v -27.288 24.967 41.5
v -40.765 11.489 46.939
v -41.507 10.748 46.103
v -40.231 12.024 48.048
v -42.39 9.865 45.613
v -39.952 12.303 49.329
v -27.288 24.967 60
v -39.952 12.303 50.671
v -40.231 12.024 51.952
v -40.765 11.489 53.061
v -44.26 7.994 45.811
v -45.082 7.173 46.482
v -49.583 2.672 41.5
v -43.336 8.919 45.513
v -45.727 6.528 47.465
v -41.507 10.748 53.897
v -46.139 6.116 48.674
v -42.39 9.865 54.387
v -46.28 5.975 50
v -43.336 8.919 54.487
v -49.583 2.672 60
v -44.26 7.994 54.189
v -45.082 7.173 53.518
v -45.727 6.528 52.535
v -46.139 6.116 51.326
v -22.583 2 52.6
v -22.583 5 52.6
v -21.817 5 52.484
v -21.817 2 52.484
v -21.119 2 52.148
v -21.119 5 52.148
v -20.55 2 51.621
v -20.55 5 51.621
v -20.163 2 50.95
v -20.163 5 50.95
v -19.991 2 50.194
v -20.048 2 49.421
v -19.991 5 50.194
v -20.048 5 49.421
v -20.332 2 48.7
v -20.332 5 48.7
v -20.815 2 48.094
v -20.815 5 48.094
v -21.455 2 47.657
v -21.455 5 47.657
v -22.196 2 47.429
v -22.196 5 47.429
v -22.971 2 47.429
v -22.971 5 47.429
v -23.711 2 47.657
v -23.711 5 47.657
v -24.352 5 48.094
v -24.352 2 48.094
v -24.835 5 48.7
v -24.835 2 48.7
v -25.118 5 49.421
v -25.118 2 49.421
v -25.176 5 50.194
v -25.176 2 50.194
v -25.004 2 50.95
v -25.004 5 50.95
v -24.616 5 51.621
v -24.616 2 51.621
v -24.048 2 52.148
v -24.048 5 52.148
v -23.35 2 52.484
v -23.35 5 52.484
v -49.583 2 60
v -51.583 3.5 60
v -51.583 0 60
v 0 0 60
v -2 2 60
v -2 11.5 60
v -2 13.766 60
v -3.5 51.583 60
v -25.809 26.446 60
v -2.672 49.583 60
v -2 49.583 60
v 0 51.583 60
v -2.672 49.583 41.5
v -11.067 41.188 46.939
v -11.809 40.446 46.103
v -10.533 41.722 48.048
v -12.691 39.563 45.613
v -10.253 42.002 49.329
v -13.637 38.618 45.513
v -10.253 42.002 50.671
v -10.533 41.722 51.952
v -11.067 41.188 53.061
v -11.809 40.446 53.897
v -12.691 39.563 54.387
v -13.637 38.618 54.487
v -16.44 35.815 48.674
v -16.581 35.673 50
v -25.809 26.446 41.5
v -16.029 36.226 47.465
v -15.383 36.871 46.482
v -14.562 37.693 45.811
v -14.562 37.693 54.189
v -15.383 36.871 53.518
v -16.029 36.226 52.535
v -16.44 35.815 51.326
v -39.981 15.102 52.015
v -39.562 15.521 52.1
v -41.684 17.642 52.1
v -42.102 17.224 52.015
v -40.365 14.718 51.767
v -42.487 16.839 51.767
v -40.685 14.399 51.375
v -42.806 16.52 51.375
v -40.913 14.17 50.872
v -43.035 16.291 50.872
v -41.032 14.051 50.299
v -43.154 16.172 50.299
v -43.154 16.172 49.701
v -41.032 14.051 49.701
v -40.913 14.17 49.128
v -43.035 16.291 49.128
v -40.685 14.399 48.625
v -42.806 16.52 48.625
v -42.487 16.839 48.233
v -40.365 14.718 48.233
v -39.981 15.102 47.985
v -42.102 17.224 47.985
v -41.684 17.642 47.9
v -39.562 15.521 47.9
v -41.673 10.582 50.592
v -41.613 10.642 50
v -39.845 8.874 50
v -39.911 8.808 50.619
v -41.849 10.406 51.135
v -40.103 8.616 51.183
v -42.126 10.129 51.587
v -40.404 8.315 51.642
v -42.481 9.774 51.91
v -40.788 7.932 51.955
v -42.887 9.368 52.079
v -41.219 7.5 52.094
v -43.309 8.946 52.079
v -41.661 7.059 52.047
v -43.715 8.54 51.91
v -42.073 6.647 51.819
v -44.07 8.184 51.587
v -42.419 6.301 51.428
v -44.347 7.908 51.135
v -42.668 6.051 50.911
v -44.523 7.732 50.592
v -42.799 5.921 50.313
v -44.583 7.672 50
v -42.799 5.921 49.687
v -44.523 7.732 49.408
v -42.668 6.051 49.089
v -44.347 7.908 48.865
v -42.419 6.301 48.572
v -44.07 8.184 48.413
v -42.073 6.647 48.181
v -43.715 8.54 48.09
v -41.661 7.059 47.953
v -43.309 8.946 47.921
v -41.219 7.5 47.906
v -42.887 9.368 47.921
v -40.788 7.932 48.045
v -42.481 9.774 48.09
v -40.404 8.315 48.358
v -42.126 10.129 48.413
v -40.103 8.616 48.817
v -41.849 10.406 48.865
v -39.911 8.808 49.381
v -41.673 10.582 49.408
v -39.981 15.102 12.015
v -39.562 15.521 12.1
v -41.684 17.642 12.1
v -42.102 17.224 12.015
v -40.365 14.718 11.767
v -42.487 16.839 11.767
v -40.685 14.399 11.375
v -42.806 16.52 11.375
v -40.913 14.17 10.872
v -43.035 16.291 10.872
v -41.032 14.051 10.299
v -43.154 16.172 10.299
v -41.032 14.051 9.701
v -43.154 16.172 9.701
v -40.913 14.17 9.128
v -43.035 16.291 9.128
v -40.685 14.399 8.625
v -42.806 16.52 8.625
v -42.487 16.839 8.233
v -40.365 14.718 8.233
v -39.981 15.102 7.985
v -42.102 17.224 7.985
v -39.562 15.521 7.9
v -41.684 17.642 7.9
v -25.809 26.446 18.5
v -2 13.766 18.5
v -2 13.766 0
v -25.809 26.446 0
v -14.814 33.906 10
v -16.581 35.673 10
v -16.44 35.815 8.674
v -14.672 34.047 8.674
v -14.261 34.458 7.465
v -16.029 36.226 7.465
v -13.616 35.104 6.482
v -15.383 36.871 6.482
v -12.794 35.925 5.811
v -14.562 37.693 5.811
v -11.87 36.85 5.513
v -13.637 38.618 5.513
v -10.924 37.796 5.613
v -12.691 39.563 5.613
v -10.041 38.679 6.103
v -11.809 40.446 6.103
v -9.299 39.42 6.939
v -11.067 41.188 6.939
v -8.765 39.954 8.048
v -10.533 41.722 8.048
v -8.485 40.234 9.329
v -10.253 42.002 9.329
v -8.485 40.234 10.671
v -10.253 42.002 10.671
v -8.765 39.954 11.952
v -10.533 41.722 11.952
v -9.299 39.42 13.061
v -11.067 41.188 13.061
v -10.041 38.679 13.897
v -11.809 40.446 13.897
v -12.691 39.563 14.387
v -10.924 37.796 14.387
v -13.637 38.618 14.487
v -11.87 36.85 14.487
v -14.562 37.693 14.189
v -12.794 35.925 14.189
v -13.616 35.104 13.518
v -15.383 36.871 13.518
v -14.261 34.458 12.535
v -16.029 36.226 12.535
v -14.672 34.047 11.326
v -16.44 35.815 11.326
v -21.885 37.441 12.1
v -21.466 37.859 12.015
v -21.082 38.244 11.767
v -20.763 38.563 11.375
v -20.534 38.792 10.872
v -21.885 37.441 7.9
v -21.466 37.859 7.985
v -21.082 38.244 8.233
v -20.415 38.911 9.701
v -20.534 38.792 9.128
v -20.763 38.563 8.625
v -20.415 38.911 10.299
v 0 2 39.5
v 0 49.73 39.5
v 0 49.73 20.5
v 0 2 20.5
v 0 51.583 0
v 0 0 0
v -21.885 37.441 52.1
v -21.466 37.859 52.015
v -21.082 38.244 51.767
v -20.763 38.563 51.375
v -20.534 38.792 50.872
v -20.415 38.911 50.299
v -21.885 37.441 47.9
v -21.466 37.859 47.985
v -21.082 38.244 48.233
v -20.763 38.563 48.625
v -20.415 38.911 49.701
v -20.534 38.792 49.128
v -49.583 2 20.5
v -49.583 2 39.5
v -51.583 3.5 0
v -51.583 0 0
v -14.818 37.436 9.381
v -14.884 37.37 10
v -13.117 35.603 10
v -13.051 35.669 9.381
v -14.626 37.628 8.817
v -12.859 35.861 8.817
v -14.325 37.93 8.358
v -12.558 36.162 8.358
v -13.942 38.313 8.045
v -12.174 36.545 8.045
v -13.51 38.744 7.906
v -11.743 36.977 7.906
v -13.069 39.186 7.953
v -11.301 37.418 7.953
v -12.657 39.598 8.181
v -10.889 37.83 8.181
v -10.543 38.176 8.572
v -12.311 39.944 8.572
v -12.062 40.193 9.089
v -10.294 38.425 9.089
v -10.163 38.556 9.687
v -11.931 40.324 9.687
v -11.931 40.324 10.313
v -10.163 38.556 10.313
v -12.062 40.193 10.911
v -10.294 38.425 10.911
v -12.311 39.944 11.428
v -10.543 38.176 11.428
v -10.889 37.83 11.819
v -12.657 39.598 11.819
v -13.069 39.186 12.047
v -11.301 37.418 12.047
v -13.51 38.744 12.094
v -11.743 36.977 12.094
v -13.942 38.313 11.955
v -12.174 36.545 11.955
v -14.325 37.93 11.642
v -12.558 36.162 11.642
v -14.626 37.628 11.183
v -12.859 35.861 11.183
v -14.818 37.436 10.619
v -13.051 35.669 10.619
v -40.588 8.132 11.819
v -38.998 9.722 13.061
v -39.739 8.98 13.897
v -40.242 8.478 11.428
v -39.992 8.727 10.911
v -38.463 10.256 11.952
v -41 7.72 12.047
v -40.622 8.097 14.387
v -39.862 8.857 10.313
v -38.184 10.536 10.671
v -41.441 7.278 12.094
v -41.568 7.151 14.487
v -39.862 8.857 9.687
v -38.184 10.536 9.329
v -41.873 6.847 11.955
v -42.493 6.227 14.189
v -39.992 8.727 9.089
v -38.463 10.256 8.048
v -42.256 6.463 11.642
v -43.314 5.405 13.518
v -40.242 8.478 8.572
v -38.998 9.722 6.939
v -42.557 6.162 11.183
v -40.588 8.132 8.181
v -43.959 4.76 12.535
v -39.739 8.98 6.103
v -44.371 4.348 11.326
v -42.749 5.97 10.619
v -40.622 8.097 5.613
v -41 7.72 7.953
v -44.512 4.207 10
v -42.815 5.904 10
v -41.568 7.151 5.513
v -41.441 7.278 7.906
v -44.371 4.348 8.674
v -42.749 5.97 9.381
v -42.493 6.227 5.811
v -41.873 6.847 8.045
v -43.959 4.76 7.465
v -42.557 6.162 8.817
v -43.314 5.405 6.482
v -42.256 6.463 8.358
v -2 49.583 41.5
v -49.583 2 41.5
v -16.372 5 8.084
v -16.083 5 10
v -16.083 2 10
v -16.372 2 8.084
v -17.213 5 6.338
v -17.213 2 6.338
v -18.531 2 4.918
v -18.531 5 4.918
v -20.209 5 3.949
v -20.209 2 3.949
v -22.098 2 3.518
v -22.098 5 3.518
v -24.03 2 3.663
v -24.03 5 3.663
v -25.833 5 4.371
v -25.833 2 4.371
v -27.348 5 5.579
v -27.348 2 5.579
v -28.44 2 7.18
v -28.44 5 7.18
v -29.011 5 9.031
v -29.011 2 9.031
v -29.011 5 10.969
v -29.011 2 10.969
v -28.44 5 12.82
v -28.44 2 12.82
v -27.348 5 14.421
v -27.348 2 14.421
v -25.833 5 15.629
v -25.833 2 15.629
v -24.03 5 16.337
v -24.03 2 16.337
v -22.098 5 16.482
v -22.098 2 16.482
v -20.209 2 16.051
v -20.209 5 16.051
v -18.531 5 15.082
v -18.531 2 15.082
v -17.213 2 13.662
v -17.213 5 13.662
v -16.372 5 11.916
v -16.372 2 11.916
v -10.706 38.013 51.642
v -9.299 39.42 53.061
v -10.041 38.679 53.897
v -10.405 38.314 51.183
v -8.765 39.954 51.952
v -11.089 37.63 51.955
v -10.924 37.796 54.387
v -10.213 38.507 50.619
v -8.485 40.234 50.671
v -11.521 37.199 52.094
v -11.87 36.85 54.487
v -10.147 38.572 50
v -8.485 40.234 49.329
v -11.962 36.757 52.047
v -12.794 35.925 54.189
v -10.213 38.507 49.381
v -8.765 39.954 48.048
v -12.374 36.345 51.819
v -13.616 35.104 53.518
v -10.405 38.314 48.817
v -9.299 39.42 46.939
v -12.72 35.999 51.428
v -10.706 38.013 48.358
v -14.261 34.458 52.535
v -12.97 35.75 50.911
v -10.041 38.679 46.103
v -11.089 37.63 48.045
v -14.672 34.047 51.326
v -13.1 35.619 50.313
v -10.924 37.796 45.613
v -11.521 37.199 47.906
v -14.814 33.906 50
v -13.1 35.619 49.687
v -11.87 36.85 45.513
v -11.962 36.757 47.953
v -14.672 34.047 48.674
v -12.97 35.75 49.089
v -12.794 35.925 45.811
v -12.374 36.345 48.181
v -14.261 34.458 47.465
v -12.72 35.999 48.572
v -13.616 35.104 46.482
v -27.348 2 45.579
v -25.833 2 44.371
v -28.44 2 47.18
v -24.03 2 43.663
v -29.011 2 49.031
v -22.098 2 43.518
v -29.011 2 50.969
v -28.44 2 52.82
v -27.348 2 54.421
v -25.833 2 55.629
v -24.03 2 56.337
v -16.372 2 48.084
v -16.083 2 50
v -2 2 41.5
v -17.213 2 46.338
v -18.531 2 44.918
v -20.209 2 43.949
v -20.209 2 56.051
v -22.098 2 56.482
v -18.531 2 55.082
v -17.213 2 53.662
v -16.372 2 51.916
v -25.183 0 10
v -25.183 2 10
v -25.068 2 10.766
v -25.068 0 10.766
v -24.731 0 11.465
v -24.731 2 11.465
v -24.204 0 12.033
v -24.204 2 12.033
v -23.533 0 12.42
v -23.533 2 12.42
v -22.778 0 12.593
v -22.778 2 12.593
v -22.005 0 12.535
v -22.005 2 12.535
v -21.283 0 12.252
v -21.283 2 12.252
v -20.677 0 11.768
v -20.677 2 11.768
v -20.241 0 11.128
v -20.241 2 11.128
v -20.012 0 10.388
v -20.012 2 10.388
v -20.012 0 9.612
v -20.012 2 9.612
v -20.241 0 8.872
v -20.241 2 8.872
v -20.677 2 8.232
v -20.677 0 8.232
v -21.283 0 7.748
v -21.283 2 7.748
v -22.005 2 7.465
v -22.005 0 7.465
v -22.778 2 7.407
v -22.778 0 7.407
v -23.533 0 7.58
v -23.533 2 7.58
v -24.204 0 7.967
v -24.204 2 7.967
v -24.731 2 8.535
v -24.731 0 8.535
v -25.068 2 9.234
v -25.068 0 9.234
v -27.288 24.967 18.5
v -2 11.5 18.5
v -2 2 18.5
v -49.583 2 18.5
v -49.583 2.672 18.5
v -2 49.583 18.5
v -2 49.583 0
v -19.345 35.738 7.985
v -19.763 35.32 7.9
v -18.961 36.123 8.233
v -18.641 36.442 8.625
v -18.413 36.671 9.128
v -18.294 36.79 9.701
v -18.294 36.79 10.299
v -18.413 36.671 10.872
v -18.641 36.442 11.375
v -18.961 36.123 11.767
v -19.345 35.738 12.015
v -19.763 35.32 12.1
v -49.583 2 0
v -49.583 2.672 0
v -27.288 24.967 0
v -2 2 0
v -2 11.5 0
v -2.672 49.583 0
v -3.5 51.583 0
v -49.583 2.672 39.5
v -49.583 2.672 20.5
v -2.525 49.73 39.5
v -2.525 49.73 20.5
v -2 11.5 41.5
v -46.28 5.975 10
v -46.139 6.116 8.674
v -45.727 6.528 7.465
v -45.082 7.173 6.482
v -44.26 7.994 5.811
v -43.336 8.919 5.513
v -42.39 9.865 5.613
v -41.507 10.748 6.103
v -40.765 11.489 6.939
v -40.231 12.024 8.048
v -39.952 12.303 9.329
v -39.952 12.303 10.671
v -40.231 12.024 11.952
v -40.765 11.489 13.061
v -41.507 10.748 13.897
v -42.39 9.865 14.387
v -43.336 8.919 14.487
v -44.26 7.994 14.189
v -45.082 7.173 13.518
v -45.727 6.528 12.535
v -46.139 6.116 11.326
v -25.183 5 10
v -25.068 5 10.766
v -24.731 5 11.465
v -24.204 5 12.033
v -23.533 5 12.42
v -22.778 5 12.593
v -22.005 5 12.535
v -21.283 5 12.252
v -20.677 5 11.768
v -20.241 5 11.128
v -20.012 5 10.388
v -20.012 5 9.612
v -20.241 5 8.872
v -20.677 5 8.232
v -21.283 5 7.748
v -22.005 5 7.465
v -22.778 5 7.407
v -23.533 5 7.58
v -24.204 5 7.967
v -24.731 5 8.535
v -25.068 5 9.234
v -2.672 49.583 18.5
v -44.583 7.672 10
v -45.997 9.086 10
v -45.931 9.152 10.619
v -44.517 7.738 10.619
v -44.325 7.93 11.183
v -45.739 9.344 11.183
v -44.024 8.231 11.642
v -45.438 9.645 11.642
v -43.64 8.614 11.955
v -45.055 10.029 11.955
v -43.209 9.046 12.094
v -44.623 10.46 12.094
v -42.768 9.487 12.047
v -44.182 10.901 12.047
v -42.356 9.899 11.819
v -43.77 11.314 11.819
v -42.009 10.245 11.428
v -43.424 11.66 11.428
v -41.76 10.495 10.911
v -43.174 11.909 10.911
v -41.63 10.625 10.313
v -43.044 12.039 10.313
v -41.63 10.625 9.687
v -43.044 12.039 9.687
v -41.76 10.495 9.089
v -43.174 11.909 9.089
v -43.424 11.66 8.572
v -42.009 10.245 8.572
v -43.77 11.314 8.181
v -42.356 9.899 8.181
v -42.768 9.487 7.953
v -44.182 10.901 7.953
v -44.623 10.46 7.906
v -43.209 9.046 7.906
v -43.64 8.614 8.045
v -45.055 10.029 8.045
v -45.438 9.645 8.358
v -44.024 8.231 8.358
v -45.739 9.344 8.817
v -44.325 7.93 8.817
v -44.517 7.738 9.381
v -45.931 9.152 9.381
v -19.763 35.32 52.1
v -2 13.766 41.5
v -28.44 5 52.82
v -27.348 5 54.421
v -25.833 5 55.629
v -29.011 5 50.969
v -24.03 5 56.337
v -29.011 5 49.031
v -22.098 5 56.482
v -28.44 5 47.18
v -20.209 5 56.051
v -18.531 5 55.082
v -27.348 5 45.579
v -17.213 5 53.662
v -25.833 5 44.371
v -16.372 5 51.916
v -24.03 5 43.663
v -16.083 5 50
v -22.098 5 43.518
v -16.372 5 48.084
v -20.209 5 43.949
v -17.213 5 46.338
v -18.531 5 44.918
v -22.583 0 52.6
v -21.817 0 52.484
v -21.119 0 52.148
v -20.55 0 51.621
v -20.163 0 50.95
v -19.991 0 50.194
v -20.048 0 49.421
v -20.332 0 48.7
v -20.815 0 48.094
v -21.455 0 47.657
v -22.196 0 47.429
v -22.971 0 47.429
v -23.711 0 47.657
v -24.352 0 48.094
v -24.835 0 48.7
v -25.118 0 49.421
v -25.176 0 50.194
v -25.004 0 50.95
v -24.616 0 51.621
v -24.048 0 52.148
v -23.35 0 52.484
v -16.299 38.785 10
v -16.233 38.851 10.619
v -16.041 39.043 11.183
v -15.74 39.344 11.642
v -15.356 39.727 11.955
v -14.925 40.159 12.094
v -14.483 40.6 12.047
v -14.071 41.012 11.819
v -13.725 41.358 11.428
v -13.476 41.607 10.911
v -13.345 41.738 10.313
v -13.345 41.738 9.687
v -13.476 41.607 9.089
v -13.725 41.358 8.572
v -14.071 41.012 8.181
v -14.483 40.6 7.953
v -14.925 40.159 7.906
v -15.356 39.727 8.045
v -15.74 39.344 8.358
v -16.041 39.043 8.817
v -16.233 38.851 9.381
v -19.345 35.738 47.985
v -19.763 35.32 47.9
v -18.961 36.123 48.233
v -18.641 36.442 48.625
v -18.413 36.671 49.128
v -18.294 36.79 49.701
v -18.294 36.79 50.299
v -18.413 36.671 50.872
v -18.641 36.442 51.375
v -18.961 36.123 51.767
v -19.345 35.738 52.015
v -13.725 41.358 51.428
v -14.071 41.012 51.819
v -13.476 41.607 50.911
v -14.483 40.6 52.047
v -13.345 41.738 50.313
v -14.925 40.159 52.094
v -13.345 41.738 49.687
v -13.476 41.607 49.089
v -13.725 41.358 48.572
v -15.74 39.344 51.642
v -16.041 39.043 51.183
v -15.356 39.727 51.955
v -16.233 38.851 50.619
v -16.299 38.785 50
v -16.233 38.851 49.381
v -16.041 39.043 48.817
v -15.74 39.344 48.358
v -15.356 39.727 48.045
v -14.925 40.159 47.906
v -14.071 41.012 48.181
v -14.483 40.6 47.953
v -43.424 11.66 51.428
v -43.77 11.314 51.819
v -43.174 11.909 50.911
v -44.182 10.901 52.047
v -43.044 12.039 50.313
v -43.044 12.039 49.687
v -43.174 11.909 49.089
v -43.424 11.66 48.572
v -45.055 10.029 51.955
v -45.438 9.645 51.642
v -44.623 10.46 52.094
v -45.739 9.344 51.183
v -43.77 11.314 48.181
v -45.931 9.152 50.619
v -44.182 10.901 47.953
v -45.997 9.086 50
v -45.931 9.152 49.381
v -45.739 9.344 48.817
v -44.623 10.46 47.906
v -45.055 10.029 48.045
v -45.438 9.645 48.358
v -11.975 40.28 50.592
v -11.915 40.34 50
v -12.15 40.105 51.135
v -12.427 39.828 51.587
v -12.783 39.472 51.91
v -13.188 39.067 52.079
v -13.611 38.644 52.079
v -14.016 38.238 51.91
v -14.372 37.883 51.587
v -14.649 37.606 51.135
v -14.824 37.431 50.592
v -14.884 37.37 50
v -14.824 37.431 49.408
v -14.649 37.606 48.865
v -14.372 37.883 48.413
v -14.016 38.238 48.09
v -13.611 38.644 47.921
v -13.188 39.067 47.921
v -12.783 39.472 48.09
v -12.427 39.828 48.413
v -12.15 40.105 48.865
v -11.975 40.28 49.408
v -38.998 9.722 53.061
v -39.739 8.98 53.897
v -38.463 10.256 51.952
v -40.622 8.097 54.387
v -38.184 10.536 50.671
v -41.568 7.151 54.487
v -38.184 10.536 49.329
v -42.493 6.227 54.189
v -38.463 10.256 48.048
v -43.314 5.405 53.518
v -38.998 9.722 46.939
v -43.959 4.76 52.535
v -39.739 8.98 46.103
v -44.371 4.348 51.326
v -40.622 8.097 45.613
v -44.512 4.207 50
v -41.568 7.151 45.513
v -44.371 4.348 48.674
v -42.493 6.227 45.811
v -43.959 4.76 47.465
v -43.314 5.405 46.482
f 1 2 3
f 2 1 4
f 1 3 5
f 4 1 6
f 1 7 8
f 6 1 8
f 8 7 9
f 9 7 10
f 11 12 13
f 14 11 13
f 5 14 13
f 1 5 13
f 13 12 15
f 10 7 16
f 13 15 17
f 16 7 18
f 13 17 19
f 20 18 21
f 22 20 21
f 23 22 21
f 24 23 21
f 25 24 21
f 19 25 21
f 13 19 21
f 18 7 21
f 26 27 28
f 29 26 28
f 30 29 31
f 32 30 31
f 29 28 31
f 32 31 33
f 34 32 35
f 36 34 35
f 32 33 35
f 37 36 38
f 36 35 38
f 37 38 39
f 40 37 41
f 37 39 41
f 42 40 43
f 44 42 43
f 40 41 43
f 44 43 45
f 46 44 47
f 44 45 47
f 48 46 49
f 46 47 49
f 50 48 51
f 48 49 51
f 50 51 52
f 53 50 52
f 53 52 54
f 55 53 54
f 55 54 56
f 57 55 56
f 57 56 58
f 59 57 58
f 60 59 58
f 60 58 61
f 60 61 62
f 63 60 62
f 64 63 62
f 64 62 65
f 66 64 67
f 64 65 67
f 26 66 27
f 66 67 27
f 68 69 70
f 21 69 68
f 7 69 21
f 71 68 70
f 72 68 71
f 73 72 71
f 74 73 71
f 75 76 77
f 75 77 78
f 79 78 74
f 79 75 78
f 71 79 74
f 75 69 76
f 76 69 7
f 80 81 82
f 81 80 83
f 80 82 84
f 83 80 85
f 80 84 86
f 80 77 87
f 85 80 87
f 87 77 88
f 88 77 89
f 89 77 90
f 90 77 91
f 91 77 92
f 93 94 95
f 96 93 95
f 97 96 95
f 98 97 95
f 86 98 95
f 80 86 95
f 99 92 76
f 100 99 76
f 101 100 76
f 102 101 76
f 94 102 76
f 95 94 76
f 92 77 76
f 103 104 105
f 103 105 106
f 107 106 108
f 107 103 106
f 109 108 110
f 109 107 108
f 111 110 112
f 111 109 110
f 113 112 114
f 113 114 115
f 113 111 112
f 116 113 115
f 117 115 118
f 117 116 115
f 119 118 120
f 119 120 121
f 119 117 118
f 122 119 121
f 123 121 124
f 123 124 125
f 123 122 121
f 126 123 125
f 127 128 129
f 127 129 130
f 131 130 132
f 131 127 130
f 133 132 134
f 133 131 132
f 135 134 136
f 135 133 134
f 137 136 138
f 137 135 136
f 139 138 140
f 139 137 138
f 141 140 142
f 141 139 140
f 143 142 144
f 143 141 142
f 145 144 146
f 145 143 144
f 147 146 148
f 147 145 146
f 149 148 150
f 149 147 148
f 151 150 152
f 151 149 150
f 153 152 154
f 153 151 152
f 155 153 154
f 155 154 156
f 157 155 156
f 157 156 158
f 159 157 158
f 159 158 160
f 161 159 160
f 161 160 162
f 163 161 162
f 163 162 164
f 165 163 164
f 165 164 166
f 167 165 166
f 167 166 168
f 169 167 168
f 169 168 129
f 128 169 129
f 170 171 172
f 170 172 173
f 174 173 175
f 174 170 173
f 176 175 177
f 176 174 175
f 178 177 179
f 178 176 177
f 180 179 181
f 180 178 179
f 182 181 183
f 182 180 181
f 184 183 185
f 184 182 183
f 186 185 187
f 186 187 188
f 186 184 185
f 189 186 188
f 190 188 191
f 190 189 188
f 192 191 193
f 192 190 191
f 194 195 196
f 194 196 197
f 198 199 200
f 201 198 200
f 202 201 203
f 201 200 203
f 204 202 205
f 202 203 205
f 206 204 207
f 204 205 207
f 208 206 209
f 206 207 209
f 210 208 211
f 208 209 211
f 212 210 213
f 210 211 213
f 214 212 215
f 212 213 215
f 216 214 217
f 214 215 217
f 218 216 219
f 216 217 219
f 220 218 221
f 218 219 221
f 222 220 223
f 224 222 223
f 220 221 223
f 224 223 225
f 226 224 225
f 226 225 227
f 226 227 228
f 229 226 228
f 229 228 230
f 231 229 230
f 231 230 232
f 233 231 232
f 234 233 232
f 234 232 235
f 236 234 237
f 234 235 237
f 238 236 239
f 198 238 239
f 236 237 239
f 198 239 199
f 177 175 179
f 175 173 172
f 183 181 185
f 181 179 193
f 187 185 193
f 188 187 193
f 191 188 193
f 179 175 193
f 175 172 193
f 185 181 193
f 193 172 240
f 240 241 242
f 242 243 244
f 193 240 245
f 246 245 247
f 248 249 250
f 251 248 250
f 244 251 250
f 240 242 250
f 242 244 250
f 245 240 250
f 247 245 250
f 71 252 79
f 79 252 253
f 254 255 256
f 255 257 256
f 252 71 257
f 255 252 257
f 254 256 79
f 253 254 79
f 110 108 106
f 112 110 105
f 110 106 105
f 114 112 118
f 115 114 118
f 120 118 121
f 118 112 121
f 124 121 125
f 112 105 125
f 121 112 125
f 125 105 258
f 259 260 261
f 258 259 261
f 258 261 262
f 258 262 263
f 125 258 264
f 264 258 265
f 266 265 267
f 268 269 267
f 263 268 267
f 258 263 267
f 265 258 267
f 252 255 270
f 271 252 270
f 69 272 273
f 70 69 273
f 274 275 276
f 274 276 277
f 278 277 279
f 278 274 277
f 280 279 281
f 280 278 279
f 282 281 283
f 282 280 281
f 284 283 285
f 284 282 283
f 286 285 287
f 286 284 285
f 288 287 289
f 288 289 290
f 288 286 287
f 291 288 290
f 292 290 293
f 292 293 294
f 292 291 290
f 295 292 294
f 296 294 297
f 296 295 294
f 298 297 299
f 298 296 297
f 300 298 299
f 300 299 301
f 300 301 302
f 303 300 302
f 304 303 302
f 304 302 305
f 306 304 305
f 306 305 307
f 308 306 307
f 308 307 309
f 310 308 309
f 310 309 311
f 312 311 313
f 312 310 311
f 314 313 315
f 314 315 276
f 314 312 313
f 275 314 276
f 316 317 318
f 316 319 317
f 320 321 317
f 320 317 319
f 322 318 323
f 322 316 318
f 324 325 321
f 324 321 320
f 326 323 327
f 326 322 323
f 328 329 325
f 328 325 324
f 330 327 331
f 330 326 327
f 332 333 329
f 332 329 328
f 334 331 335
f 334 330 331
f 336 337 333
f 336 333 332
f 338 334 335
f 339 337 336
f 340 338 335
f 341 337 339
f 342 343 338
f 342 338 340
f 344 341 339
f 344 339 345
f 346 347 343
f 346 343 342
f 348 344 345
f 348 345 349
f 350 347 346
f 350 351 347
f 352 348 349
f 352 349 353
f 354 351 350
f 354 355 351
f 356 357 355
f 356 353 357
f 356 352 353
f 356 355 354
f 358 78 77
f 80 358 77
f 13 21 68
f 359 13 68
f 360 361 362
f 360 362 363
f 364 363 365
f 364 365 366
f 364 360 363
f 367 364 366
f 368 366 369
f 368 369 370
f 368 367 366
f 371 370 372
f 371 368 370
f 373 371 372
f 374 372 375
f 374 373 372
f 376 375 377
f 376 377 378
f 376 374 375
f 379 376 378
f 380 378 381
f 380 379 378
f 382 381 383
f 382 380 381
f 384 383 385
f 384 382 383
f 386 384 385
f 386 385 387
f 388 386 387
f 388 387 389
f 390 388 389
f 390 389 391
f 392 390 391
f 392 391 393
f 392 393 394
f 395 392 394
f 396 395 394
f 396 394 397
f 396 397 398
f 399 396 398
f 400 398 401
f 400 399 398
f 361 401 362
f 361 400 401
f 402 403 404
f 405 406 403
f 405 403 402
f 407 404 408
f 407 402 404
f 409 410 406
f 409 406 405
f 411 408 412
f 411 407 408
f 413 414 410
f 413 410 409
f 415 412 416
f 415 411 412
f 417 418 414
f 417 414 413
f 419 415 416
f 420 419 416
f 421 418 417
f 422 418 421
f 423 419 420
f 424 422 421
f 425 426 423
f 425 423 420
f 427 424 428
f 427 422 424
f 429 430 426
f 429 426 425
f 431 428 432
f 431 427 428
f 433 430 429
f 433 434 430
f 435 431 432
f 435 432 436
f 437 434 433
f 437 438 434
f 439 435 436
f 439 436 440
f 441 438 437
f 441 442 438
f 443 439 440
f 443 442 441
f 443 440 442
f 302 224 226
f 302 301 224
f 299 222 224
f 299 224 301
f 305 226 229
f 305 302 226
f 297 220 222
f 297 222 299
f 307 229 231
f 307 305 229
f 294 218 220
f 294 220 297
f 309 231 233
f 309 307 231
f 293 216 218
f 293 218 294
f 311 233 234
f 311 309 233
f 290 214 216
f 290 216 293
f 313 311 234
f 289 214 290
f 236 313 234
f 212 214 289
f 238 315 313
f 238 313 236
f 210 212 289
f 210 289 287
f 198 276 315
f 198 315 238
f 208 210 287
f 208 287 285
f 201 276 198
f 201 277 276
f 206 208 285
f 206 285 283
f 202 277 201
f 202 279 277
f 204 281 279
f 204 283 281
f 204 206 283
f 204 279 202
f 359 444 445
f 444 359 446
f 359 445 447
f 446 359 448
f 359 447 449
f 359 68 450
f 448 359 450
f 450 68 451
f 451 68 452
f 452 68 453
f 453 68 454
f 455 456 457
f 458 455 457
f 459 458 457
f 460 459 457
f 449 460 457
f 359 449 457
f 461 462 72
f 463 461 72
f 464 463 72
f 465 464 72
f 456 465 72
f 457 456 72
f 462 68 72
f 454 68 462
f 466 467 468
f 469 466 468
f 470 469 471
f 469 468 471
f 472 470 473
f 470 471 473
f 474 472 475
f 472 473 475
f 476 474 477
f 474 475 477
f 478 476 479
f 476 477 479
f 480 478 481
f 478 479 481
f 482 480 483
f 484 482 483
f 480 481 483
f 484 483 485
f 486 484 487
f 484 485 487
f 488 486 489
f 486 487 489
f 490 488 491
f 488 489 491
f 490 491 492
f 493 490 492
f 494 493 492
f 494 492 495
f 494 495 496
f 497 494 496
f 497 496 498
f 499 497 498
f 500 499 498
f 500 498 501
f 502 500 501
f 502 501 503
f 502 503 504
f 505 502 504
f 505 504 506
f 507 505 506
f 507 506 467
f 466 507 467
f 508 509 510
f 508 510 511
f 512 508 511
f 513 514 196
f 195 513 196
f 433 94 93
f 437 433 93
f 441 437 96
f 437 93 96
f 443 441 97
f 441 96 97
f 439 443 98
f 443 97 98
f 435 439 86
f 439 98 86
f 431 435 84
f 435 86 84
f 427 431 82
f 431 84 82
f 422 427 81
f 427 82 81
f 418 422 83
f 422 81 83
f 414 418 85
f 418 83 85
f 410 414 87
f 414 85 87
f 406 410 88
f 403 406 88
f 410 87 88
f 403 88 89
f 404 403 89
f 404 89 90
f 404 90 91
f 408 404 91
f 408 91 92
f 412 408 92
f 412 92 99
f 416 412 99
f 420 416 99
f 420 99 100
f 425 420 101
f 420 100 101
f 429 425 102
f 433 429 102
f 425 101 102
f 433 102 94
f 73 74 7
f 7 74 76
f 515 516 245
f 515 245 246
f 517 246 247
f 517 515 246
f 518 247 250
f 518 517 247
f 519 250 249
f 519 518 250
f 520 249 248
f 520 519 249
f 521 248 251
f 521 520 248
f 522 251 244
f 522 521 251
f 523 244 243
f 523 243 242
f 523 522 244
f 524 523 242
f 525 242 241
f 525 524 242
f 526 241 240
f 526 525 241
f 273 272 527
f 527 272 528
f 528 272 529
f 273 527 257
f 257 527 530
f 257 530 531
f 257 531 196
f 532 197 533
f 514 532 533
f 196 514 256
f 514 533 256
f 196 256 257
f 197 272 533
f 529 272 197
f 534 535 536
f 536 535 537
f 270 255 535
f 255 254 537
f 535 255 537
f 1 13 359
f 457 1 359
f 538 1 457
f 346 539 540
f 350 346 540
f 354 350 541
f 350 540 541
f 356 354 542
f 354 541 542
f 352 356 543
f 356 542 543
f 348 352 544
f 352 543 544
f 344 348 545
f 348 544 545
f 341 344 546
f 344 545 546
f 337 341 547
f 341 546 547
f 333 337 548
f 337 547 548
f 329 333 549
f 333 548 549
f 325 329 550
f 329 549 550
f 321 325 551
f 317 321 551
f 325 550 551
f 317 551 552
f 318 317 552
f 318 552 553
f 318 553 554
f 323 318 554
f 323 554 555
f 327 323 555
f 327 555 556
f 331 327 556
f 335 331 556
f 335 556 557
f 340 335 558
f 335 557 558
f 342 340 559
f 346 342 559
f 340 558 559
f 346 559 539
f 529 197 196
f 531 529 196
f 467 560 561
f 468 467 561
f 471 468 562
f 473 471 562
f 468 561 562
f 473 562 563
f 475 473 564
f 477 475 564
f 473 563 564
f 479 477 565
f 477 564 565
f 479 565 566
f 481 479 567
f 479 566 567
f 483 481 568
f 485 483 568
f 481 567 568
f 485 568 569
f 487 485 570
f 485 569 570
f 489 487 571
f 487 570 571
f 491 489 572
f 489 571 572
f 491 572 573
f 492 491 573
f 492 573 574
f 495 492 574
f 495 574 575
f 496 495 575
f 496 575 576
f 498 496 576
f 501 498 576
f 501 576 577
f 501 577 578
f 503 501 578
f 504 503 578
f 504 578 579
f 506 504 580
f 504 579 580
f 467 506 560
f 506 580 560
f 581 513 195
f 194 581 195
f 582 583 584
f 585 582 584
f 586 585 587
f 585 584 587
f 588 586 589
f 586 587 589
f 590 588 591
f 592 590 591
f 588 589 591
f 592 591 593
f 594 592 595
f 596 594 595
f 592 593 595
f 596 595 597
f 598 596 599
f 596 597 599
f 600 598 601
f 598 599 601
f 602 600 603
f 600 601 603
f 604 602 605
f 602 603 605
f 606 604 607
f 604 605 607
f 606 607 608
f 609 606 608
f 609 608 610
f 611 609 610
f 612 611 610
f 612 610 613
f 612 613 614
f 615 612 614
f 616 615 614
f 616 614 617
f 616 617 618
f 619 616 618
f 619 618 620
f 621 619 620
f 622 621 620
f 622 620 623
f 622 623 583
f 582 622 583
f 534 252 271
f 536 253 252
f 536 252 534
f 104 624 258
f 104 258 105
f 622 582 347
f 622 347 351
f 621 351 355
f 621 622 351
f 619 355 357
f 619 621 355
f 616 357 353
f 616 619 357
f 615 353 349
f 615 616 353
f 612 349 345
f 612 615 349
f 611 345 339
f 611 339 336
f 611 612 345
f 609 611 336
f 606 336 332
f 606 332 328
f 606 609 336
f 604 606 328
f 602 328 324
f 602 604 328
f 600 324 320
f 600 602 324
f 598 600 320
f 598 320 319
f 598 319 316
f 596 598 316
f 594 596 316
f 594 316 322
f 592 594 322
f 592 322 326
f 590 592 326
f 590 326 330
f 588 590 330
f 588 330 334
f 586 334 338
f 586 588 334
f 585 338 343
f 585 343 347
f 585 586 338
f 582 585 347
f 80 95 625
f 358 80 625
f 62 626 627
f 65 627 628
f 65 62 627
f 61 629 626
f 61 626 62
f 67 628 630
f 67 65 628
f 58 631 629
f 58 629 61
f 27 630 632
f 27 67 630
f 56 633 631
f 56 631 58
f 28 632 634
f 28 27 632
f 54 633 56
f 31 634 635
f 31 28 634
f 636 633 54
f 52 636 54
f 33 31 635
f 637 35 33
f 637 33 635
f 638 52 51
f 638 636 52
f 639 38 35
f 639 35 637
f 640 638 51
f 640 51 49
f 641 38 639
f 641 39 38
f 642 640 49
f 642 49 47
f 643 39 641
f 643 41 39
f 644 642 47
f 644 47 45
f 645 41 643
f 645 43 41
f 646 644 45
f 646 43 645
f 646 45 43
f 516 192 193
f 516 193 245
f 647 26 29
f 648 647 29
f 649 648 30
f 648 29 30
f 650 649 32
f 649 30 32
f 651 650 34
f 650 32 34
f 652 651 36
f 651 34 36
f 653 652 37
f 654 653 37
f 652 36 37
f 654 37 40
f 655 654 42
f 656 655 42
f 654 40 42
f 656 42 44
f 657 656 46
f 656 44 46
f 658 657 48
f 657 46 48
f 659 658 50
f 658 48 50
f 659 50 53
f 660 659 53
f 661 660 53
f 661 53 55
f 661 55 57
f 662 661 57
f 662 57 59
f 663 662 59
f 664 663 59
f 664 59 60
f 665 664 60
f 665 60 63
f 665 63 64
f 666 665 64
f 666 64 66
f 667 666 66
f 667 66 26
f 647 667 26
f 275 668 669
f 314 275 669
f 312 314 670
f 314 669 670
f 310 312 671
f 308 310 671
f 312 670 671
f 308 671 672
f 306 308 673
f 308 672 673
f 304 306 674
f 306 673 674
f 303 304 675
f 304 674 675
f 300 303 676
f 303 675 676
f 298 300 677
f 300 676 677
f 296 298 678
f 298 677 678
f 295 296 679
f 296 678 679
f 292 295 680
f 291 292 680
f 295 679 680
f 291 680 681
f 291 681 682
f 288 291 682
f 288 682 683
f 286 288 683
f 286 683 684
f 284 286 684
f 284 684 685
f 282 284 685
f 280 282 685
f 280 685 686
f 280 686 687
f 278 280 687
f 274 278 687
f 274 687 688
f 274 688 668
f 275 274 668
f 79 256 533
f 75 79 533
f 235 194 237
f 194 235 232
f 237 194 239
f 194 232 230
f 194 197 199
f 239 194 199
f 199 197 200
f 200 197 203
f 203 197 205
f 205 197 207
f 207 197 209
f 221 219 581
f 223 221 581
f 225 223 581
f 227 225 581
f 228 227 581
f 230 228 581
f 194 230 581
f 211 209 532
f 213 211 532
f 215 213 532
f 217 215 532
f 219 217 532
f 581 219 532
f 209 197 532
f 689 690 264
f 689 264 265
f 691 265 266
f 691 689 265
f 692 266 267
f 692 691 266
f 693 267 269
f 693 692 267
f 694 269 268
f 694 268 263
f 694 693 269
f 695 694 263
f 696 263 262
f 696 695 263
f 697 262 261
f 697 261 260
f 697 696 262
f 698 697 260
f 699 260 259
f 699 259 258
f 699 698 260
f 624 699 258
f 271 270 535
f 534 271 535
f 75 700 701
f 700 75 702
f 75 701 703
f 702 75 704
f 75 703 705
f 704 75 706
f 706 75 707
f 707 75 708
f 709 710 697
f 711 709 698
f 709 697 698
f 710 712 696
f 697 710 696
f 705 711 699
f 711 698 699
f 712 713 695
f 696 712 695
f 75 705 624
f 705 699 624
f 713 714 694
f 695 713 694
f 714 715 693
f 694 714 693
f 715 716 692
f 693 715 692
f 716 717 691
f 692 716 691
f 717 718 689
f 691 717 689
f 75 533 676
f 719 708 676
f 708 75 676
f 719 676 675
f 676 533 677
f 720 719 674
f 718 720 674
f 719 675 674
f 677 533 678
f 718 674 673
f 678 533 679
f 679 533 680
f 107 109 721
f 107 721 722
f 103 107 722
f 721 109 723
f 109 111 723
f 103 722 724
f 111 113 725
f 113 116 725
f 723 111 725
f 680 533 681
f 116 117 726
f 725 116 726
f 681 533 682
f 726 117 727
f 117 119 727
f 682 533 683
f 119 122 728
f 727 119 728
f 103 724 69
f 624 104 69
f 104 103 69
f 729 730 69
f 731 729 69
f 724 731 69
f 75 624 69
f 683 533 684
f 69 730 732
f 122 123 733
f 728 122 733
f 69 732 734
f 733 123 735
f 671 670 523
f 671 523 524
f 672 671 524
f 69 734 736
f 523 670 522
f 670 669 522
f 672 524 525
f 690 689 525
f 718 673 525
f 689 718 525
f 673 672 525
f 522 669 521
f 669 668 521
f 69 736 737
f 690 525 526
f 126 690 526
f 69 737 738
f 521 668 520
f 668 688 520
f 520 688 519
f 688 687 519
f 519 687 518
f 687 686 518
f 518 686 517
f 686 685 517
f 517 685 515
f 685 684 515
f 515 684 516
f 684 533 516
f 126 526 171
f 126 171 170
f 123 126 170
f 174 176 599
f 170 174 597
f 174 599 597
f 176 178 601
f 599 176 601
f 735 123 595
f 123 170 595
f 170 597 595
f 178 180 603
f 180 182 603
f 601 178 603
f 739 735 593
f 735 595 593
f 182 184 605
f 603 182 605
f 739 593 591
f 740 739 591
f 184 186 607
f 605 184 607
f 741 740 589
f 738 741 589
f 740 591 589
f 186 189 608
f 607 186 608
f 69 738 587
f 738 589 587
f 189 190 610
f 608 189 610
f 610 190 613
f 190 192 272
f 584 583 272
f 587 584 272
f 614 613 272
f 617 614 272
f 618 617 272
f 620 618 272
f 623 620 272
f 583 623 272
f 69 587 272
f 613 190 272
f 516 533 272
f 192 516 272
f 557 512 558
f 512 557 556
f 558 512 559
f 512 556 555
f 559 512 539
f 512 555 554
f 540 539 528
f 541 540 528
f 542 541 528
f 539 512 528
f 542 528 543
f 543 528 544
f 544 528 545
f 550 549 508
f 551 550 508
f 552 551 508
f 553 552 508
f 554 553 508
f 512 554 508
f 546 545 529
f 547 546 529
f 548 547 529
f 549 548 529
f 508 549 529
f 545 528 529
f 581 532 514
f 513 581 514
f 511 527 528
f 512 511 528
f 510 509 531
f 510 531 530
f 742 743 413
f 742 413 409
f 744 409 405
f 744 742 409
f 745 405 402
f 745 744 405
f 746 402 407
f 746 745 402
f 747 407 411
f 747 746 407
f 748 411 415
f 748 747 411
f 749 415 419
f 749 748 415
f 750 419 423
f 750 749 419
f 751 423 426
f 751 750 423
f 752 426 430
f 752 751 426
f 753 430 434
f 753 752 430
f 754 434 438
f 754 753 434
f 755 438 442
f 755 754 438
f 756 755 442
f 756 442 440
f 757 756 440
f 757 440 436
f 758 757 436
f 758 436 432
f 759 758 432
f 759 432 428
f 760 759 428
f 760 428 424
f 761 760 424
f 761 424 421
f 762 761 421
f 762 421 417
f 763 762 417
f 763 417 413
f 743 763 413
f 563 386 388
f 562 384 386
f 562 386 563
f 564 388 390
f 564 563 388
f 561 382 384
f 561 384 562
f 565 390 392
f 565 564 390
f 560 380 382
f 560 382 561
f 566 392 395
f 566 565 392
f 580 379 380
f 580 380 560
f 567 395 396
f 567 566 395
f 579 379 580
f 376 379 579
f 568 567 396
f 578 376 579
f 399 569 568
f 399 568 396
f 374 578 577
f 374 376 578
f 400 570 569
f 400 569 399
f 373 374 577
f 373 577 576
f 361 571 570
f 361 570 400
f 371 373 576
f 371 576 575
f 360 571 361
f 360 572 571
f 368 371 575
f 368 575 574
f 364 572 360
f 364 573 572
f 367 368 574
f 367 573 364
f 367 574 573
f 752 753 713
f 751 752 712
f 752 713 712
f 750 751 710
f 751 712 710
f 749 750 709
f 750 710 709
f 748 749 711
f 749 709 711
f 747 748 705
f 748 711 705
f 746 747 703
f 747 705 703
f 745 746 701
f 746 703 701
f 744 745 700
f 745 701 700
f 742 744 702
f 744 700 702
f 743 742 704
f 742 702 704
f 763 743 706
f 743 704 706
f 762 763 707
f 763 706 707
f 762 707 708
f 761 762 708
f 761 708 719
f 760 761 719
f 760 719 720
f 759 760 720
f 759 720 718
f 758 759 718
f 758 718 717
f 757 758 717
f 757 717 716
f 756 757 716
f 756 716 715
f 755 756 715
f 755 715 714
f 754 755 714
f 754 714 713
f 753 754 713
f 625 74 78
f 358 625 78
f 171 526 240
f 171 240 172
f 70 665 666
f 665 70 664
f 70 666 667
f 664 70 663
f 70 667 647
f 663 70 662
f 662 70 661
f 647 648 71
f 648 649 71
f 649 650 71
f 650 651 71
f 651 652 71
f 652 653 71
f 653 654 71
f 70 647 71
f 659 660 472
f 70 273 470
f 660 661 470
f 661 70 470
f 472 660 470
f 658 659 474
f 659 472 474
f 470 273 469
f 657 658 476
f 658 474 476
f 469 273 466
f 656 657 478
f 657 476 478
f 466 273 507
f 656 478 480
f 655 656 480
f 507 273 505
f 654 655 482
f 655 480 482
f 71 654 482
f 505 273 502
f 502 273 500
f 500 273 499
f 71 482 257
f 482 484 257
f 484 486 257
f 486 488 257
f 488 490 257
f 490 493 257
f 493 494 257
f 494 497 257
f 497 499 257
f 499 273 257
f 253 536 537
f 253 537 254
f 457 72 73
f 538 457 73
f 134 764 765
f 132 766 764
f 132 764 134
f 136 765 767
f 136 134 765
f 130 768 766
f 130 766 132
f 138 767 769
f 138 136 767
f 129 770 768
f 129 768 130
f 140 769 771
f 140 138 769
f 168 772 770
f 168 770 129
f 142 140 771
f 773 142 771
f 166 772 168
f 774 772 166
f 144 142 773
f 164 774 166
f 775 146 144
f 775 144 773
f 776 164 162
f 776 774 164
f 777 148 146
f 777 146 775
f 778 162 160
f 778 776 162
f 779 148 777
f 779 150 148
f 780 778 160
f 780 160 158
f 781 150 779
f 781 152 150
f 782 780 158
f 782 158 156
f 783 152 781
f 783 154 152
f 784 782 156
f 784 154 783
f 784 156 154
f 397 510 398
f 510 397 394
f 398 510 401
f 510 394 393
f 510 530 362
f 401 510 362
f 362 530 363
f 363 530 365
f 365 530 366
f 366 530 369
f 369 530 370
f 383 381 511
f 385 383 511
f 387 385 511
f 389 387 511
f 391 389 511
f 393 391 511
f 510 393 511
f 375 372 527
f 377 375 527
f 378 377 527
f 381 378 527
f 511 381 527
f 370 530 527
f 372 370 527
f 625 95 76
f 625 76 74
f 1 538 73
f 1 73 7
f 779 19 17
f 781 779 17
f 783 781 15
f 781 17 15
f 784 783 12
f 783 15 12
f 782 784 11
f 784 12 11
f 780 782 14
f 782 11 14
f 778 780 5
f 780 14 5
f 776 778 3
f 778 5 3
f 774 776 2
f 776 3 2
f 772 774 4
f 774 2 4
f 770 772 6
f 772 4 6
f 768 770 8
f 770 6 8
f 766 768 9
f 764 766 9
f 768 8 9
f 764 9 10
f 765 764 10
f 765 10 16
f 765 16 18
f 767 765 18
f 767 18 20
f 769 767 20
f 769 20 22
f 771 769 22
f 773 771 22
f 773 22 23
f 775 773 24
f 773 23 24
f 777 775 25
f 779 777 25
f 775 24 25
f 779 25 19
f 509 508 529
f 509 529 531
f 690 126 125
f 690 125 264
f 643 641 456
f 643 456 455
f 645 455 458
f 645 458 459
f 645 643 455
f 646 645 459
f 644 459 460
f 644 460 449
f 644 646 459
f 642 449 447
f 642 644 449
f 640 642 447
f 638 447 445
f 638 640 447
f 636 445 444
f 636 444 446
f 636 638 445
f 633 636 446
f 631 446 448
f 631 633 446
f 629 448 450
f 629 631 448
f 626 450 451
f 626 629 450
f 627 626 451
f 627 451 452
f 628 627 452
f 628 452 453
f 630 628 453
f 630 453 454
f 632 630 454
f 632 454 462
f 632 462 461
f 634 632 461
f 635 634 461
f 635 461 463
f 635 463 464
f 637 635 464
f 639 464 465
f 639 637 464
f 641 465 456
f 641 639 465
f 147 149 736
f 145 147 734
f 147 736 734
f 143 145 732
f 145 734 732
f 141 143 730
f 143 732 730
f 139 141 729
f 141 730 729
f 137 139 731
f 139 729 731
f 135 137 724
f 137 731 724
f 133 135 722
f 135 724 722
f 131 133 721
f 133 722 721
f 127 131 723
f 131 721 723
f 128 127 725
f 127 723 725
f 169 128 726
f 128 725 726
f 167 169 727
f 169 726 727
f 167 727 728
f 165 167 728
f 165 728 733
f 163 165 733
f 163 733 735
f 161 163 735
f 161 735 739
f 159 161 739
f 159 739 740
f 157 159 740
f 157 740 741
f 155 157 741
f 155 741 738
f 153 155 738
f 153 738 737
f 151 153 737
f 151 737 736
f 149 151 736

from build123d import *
from build123d.topology import SkipClean

# Parameters (mm, degrees)
EXTRUDE_1_DEPTH     = 60
CUT_EXTRUDE_1_DEPTH = 18.5
CUT_EXTRUDE_2_DEPTH = 18.5
SKETCH_5_R          = 2.1
CUT_EXTRUDE_3_DEPTH = 3
CUT_EXTRUDE_START   = -2
CUT_EXTRUDE_4_DEPTH = 19
SKETCH_9_R          = 4.5
SKETCH_9_R_2        = 2.1
EXTRUDE_2_DEPTH     = 2.5
SKETCH_11_R         = 2.6
CUT_EXTRUDE_5_DEPTH = 3
EXTRUDE_START       = 3
SKETCH_12_R         = 6.5
SKETCH_12_R_2       = 2.6
EXTRUDE_3_DEPTH     = 3
EXTRUDE_4_DEPTH     = 18.5
EXTRUDE_8_DEPTH     = 18.5
EXTRUDE_9_DEPTH     = 3


with BuildPart() as part:
    # 草图1 → 凸台-拉伸1 (new body)
    with BuildSketch(Plane.XY):
        Polygon((0, 0), (0, 51.583261121), (-3.5, 51.583261121), (-51.583261121, 3.5), (-51.583261121, 0), align=None)
    extrude(amount=EXTRUDE_1_DEPTH)

    # 草图3 → 切除-拉伸1 (cut)
    with BuildSketch(Plane.XY.offset(60)):
        Polygon((-49.583261121, 2), (-2, 2), (-2, 49.583261121), (-2.671572875, 49.583261121), (-49.583261121, 2.671572875), align=None)
    extrude(amount=-CUT_EXTRUDE_1_DEPTH, mode=Mode.SUBTRACT)

    # 草图4 → 切除-拉伸2 (cut)
    with BuildSketch(Plane(origin=(0, 0, 0), x_dir=(-1, 0, 0), z_dir=(0, 0, -1))):
        Polygon((2, 2), (49.583261121, 2), (49.583261121, 2.671572875), (2.671572875, 49.583261121), (2, 49.583261121), align=None)
    extrude(amount=-CUT_EXTRUDE_2_DEPTH, mode=Mode.SUBTRACT)

    # 草图5 → 切除-拉伸3 (cut)
    with BuildSketch(Plane(origin=(-27.54163056, 27.54163056, 0), x_dir=(0, 0, 1), z_dir=(-0.7071067811865398, 0.7071067811865552, 0))):
        with Locations(Location((10, 18, 0), (0, 0, 270))):
            Circle(SKETCH_5_R)
        with Locations(Location((10, -24, 0), (0, 0, 270))):
            Circle(SKETCH_5_R)
        with Locations(Location((50, -24, 0), (0, 0, 270))):
            Circle(SKETCH_5_R)
        with Locations(Location((50, 18, 0), (0, 0, 270))):
            Circle(SKETCH_5_R)
    extrude(amount=-CUT_EXTRUDE_3_DEPTH, mode=Mode.SUBTRACT)

    # 草图6 → 切除-拉伸4 (cut)
    with BuildSketch(Plane(origin=(0, 0, 18.5), x_dir=(-1, 0, 0), z_dir=(0, 0, -1)).offset(CUT_EXTRUDE_START)):
        Polygon((49.583261121, 2), (49.583261121, 2.671572875), (2.525126266, 49.72970773), (-2.717199738, 49.72970773), (-2.717199738, 2), align=None)
    extrude(amount=-CUT_EXTRUDE_4_DEPTH, mode=Mode.SUBTRACT)

    # 草图9 → 凸台-拉伸2 (add)
    # profile 1 of 4: a face of its own
    with SkipClean():  # the faces are left unmerged after this step: merging them gives an invalid solid
        with BuildSketch(Plane(origin=(-26.127416998, 26.127416998, 0), x_dir=(0, 0, -1), z_dir=(0.7071067811865432, -0.7071067811865519, 0))):
            with Locations(Location((-10, 18, 0), (0, 0, 270))):
                Circle(SKETCH_9_R)
            with Locations(Location((-10, 18, 0), (0, 0, 270))):
                Circle(SKETCH_9_R_2, mode=Mode.SUBTRACT)
        # profile 2 of 4: a face of its own
        with BuildSketch(Plane(origin=(-26.127416998, 26.127416998, 0), x_dir=(0, 0, -1), z_dir=(0.7071067811865432, -0.7071067811865519, 0))):
            with Locations(Location((-10, -24, 0), (0, 0, 270))):
                Circle(SKETCH_9_R)
            with Locations(Location((-10, -24, 0), (0, 0, 270))):
                Circle(SKETCH_9_R_2, mode=Mode.SUBTRACT)
        # profile 3 of 4: a face of its own
        with BuildSketch(Plane(origin=(-26.127416998, 26.127416998, 0), x_dir=(0, 0, -1), z_dir=(0.7071067811865432, -0.7071067811865519, 0))):
            with Locations(Location((-50, 18, 0), (0, 0, 270))):
                Circle(SKETCH_9_R)
            with Locations(Location((-50, 18, 0), (0, 0, 90))):
                Circle(SKETCH_9_R_2, mode=Mode.SUBTRACT)
        # profile 4 of 4: a face of its own
        with BuildSketch(Plane(origin=(-26.127416998, 26.127416998, 0), x_dir=(0, 0, -1), z_dir=(0.7071067811865432, -0.7071067811865519, 0))):
            with Locations(Location((-50, -24, 0), (0, 0, 270))):
                Circle(SKETCH_9_R)
            with Locations(Location((-50, -24, 0), (0, 0, 90))):
                Circle(SKETCH_9_R_2, mode=Mode.SUBTRACT)
        extrude(amount=EXTRUDE_2_DEPTH)

    # 草图11 → 切除-拉伸5 (cut)
    with SkipClean():  # the faces are left unmerged after this step: merging them gives an invalid solid
        with BuildSketch(Plane(origin=(0, 2, 0), x_dir=(1, 0, 0), z_dir=(0, 1, 0))):
            with Locations(Location((-22.583261121, -10, 0), (0, 0, 180))):
                Circle(SKETCH_11_R)
            with Locations(Location((-22.583261121, -50, 0), (0, 0, 270))):
                Circle(SKETCH_11_R)
        extrude(amount=-CUT_EXTRUDE_5_DEPTH, mode=Mode.SUBTRACT)

    # 草图12 → 凸台-拉伸3 (add)
    # profile 1 of 2: a face of its own
    with SkipClean():  # the faces are left unmerged after this step: merging them gives an invalid solid
        with BuildSketch(Plane(origin=(0, 2, 0), x_dir=(1, 0, 0), z_dir=(0, 1, 0)).offset(EXTRUDE_START)):
            with Locations((-22.583261121, -10)):
                Circle(SKETCH_12_R)
            with Locations(Location((-22.583261121, -10, 0), (0, 0, 180))):
                Circle(SKETCH_12_R_2, mode=Mode.SUBTRACT)
        # profile 2 of 2: a face of its own
        with BuildSketch(Plane(origin=(0, 2, 0), x_dir=(1, 0, 0), z_dir=(0, 1, 0)).offset(EXTRUDE_START)):
            with Locations((-22.583261121, -50)):
                Circle(SKETCH_12_R)
            with Locations(Location((-22.583261121, -50, 0), (0, 0, 270))):
                Circle(SKETCH_12_R_2, mode=Mode.SUBTRACT)
        extrude(amount=-EXTRUDE_3_DEPTH)

    # 草图13 → 凸台-拉伸4 (add)
    with SkipClean():  # the faces are left unmerged after this step: merging them gives an invalid solid
        with BuildSketch(Plane.XY.offset(41.5)):
            Polygon((-2, 11.5), (-27.287858206, 24.966975789), (-25.809321526, 26.44551247), (-2, 13.765927116), align=None)
        extrude(amount=EXTRUDE_4_DEPTH)

    # 草图14 → 凸台-拉伸8 (add)
    with SkipClean():  # the faces are left unmerged after this step: merging them gives an invalid solid
        with BuildSketch(Plane(origin=(0, 0, 18.5), x_dir=(-1, 0, 0), z_dir=(0, 0, -1))):
            Polygon((2, 11.5), (2, 13.765927116), (25.809321526, 26.44551247), (27.287858206, 24.966975789), align=None)
        extrude(amount=EXTRUDE_8_DEPTH)

    # 草图18 → 凸台-拉伸9 (add)
    with SkipClean():  # the faces are left unmerged after this step: merging them gives an invalid solid
        with BuildSketch(Plane(origin=(-27.54163056, 27.54163056, 0), x_dir=(0, 0, 1), z_dir=(-0.70710678118654, 0.7071067811865551, 0))):
            with BuildLine():
                Line((12.1, 11), (12.1, -17))
                ThreePointArc((12.1, -17), (10, -19.1), (7.9, -17))
                Line((7.9, -17), (7.9, 11))
                ThreePointArc((7.9, 11), (10, 13.1), (12.1, 11))
            make_face()
            with BuildLine():
                Line((52.1, 11), (52.1, -17))
                ThreePointArc((52.1, -17), (50, -19.1), (47.9, -17))
                Line((47.9, -17), (47.9, 11))
                ThreePointArc((47.9, 11), (50, 13.1), (52.1, 11))
            make_face()
        extrude(amount=EXTRUDE_9_DEPTH)


solid = part.part
